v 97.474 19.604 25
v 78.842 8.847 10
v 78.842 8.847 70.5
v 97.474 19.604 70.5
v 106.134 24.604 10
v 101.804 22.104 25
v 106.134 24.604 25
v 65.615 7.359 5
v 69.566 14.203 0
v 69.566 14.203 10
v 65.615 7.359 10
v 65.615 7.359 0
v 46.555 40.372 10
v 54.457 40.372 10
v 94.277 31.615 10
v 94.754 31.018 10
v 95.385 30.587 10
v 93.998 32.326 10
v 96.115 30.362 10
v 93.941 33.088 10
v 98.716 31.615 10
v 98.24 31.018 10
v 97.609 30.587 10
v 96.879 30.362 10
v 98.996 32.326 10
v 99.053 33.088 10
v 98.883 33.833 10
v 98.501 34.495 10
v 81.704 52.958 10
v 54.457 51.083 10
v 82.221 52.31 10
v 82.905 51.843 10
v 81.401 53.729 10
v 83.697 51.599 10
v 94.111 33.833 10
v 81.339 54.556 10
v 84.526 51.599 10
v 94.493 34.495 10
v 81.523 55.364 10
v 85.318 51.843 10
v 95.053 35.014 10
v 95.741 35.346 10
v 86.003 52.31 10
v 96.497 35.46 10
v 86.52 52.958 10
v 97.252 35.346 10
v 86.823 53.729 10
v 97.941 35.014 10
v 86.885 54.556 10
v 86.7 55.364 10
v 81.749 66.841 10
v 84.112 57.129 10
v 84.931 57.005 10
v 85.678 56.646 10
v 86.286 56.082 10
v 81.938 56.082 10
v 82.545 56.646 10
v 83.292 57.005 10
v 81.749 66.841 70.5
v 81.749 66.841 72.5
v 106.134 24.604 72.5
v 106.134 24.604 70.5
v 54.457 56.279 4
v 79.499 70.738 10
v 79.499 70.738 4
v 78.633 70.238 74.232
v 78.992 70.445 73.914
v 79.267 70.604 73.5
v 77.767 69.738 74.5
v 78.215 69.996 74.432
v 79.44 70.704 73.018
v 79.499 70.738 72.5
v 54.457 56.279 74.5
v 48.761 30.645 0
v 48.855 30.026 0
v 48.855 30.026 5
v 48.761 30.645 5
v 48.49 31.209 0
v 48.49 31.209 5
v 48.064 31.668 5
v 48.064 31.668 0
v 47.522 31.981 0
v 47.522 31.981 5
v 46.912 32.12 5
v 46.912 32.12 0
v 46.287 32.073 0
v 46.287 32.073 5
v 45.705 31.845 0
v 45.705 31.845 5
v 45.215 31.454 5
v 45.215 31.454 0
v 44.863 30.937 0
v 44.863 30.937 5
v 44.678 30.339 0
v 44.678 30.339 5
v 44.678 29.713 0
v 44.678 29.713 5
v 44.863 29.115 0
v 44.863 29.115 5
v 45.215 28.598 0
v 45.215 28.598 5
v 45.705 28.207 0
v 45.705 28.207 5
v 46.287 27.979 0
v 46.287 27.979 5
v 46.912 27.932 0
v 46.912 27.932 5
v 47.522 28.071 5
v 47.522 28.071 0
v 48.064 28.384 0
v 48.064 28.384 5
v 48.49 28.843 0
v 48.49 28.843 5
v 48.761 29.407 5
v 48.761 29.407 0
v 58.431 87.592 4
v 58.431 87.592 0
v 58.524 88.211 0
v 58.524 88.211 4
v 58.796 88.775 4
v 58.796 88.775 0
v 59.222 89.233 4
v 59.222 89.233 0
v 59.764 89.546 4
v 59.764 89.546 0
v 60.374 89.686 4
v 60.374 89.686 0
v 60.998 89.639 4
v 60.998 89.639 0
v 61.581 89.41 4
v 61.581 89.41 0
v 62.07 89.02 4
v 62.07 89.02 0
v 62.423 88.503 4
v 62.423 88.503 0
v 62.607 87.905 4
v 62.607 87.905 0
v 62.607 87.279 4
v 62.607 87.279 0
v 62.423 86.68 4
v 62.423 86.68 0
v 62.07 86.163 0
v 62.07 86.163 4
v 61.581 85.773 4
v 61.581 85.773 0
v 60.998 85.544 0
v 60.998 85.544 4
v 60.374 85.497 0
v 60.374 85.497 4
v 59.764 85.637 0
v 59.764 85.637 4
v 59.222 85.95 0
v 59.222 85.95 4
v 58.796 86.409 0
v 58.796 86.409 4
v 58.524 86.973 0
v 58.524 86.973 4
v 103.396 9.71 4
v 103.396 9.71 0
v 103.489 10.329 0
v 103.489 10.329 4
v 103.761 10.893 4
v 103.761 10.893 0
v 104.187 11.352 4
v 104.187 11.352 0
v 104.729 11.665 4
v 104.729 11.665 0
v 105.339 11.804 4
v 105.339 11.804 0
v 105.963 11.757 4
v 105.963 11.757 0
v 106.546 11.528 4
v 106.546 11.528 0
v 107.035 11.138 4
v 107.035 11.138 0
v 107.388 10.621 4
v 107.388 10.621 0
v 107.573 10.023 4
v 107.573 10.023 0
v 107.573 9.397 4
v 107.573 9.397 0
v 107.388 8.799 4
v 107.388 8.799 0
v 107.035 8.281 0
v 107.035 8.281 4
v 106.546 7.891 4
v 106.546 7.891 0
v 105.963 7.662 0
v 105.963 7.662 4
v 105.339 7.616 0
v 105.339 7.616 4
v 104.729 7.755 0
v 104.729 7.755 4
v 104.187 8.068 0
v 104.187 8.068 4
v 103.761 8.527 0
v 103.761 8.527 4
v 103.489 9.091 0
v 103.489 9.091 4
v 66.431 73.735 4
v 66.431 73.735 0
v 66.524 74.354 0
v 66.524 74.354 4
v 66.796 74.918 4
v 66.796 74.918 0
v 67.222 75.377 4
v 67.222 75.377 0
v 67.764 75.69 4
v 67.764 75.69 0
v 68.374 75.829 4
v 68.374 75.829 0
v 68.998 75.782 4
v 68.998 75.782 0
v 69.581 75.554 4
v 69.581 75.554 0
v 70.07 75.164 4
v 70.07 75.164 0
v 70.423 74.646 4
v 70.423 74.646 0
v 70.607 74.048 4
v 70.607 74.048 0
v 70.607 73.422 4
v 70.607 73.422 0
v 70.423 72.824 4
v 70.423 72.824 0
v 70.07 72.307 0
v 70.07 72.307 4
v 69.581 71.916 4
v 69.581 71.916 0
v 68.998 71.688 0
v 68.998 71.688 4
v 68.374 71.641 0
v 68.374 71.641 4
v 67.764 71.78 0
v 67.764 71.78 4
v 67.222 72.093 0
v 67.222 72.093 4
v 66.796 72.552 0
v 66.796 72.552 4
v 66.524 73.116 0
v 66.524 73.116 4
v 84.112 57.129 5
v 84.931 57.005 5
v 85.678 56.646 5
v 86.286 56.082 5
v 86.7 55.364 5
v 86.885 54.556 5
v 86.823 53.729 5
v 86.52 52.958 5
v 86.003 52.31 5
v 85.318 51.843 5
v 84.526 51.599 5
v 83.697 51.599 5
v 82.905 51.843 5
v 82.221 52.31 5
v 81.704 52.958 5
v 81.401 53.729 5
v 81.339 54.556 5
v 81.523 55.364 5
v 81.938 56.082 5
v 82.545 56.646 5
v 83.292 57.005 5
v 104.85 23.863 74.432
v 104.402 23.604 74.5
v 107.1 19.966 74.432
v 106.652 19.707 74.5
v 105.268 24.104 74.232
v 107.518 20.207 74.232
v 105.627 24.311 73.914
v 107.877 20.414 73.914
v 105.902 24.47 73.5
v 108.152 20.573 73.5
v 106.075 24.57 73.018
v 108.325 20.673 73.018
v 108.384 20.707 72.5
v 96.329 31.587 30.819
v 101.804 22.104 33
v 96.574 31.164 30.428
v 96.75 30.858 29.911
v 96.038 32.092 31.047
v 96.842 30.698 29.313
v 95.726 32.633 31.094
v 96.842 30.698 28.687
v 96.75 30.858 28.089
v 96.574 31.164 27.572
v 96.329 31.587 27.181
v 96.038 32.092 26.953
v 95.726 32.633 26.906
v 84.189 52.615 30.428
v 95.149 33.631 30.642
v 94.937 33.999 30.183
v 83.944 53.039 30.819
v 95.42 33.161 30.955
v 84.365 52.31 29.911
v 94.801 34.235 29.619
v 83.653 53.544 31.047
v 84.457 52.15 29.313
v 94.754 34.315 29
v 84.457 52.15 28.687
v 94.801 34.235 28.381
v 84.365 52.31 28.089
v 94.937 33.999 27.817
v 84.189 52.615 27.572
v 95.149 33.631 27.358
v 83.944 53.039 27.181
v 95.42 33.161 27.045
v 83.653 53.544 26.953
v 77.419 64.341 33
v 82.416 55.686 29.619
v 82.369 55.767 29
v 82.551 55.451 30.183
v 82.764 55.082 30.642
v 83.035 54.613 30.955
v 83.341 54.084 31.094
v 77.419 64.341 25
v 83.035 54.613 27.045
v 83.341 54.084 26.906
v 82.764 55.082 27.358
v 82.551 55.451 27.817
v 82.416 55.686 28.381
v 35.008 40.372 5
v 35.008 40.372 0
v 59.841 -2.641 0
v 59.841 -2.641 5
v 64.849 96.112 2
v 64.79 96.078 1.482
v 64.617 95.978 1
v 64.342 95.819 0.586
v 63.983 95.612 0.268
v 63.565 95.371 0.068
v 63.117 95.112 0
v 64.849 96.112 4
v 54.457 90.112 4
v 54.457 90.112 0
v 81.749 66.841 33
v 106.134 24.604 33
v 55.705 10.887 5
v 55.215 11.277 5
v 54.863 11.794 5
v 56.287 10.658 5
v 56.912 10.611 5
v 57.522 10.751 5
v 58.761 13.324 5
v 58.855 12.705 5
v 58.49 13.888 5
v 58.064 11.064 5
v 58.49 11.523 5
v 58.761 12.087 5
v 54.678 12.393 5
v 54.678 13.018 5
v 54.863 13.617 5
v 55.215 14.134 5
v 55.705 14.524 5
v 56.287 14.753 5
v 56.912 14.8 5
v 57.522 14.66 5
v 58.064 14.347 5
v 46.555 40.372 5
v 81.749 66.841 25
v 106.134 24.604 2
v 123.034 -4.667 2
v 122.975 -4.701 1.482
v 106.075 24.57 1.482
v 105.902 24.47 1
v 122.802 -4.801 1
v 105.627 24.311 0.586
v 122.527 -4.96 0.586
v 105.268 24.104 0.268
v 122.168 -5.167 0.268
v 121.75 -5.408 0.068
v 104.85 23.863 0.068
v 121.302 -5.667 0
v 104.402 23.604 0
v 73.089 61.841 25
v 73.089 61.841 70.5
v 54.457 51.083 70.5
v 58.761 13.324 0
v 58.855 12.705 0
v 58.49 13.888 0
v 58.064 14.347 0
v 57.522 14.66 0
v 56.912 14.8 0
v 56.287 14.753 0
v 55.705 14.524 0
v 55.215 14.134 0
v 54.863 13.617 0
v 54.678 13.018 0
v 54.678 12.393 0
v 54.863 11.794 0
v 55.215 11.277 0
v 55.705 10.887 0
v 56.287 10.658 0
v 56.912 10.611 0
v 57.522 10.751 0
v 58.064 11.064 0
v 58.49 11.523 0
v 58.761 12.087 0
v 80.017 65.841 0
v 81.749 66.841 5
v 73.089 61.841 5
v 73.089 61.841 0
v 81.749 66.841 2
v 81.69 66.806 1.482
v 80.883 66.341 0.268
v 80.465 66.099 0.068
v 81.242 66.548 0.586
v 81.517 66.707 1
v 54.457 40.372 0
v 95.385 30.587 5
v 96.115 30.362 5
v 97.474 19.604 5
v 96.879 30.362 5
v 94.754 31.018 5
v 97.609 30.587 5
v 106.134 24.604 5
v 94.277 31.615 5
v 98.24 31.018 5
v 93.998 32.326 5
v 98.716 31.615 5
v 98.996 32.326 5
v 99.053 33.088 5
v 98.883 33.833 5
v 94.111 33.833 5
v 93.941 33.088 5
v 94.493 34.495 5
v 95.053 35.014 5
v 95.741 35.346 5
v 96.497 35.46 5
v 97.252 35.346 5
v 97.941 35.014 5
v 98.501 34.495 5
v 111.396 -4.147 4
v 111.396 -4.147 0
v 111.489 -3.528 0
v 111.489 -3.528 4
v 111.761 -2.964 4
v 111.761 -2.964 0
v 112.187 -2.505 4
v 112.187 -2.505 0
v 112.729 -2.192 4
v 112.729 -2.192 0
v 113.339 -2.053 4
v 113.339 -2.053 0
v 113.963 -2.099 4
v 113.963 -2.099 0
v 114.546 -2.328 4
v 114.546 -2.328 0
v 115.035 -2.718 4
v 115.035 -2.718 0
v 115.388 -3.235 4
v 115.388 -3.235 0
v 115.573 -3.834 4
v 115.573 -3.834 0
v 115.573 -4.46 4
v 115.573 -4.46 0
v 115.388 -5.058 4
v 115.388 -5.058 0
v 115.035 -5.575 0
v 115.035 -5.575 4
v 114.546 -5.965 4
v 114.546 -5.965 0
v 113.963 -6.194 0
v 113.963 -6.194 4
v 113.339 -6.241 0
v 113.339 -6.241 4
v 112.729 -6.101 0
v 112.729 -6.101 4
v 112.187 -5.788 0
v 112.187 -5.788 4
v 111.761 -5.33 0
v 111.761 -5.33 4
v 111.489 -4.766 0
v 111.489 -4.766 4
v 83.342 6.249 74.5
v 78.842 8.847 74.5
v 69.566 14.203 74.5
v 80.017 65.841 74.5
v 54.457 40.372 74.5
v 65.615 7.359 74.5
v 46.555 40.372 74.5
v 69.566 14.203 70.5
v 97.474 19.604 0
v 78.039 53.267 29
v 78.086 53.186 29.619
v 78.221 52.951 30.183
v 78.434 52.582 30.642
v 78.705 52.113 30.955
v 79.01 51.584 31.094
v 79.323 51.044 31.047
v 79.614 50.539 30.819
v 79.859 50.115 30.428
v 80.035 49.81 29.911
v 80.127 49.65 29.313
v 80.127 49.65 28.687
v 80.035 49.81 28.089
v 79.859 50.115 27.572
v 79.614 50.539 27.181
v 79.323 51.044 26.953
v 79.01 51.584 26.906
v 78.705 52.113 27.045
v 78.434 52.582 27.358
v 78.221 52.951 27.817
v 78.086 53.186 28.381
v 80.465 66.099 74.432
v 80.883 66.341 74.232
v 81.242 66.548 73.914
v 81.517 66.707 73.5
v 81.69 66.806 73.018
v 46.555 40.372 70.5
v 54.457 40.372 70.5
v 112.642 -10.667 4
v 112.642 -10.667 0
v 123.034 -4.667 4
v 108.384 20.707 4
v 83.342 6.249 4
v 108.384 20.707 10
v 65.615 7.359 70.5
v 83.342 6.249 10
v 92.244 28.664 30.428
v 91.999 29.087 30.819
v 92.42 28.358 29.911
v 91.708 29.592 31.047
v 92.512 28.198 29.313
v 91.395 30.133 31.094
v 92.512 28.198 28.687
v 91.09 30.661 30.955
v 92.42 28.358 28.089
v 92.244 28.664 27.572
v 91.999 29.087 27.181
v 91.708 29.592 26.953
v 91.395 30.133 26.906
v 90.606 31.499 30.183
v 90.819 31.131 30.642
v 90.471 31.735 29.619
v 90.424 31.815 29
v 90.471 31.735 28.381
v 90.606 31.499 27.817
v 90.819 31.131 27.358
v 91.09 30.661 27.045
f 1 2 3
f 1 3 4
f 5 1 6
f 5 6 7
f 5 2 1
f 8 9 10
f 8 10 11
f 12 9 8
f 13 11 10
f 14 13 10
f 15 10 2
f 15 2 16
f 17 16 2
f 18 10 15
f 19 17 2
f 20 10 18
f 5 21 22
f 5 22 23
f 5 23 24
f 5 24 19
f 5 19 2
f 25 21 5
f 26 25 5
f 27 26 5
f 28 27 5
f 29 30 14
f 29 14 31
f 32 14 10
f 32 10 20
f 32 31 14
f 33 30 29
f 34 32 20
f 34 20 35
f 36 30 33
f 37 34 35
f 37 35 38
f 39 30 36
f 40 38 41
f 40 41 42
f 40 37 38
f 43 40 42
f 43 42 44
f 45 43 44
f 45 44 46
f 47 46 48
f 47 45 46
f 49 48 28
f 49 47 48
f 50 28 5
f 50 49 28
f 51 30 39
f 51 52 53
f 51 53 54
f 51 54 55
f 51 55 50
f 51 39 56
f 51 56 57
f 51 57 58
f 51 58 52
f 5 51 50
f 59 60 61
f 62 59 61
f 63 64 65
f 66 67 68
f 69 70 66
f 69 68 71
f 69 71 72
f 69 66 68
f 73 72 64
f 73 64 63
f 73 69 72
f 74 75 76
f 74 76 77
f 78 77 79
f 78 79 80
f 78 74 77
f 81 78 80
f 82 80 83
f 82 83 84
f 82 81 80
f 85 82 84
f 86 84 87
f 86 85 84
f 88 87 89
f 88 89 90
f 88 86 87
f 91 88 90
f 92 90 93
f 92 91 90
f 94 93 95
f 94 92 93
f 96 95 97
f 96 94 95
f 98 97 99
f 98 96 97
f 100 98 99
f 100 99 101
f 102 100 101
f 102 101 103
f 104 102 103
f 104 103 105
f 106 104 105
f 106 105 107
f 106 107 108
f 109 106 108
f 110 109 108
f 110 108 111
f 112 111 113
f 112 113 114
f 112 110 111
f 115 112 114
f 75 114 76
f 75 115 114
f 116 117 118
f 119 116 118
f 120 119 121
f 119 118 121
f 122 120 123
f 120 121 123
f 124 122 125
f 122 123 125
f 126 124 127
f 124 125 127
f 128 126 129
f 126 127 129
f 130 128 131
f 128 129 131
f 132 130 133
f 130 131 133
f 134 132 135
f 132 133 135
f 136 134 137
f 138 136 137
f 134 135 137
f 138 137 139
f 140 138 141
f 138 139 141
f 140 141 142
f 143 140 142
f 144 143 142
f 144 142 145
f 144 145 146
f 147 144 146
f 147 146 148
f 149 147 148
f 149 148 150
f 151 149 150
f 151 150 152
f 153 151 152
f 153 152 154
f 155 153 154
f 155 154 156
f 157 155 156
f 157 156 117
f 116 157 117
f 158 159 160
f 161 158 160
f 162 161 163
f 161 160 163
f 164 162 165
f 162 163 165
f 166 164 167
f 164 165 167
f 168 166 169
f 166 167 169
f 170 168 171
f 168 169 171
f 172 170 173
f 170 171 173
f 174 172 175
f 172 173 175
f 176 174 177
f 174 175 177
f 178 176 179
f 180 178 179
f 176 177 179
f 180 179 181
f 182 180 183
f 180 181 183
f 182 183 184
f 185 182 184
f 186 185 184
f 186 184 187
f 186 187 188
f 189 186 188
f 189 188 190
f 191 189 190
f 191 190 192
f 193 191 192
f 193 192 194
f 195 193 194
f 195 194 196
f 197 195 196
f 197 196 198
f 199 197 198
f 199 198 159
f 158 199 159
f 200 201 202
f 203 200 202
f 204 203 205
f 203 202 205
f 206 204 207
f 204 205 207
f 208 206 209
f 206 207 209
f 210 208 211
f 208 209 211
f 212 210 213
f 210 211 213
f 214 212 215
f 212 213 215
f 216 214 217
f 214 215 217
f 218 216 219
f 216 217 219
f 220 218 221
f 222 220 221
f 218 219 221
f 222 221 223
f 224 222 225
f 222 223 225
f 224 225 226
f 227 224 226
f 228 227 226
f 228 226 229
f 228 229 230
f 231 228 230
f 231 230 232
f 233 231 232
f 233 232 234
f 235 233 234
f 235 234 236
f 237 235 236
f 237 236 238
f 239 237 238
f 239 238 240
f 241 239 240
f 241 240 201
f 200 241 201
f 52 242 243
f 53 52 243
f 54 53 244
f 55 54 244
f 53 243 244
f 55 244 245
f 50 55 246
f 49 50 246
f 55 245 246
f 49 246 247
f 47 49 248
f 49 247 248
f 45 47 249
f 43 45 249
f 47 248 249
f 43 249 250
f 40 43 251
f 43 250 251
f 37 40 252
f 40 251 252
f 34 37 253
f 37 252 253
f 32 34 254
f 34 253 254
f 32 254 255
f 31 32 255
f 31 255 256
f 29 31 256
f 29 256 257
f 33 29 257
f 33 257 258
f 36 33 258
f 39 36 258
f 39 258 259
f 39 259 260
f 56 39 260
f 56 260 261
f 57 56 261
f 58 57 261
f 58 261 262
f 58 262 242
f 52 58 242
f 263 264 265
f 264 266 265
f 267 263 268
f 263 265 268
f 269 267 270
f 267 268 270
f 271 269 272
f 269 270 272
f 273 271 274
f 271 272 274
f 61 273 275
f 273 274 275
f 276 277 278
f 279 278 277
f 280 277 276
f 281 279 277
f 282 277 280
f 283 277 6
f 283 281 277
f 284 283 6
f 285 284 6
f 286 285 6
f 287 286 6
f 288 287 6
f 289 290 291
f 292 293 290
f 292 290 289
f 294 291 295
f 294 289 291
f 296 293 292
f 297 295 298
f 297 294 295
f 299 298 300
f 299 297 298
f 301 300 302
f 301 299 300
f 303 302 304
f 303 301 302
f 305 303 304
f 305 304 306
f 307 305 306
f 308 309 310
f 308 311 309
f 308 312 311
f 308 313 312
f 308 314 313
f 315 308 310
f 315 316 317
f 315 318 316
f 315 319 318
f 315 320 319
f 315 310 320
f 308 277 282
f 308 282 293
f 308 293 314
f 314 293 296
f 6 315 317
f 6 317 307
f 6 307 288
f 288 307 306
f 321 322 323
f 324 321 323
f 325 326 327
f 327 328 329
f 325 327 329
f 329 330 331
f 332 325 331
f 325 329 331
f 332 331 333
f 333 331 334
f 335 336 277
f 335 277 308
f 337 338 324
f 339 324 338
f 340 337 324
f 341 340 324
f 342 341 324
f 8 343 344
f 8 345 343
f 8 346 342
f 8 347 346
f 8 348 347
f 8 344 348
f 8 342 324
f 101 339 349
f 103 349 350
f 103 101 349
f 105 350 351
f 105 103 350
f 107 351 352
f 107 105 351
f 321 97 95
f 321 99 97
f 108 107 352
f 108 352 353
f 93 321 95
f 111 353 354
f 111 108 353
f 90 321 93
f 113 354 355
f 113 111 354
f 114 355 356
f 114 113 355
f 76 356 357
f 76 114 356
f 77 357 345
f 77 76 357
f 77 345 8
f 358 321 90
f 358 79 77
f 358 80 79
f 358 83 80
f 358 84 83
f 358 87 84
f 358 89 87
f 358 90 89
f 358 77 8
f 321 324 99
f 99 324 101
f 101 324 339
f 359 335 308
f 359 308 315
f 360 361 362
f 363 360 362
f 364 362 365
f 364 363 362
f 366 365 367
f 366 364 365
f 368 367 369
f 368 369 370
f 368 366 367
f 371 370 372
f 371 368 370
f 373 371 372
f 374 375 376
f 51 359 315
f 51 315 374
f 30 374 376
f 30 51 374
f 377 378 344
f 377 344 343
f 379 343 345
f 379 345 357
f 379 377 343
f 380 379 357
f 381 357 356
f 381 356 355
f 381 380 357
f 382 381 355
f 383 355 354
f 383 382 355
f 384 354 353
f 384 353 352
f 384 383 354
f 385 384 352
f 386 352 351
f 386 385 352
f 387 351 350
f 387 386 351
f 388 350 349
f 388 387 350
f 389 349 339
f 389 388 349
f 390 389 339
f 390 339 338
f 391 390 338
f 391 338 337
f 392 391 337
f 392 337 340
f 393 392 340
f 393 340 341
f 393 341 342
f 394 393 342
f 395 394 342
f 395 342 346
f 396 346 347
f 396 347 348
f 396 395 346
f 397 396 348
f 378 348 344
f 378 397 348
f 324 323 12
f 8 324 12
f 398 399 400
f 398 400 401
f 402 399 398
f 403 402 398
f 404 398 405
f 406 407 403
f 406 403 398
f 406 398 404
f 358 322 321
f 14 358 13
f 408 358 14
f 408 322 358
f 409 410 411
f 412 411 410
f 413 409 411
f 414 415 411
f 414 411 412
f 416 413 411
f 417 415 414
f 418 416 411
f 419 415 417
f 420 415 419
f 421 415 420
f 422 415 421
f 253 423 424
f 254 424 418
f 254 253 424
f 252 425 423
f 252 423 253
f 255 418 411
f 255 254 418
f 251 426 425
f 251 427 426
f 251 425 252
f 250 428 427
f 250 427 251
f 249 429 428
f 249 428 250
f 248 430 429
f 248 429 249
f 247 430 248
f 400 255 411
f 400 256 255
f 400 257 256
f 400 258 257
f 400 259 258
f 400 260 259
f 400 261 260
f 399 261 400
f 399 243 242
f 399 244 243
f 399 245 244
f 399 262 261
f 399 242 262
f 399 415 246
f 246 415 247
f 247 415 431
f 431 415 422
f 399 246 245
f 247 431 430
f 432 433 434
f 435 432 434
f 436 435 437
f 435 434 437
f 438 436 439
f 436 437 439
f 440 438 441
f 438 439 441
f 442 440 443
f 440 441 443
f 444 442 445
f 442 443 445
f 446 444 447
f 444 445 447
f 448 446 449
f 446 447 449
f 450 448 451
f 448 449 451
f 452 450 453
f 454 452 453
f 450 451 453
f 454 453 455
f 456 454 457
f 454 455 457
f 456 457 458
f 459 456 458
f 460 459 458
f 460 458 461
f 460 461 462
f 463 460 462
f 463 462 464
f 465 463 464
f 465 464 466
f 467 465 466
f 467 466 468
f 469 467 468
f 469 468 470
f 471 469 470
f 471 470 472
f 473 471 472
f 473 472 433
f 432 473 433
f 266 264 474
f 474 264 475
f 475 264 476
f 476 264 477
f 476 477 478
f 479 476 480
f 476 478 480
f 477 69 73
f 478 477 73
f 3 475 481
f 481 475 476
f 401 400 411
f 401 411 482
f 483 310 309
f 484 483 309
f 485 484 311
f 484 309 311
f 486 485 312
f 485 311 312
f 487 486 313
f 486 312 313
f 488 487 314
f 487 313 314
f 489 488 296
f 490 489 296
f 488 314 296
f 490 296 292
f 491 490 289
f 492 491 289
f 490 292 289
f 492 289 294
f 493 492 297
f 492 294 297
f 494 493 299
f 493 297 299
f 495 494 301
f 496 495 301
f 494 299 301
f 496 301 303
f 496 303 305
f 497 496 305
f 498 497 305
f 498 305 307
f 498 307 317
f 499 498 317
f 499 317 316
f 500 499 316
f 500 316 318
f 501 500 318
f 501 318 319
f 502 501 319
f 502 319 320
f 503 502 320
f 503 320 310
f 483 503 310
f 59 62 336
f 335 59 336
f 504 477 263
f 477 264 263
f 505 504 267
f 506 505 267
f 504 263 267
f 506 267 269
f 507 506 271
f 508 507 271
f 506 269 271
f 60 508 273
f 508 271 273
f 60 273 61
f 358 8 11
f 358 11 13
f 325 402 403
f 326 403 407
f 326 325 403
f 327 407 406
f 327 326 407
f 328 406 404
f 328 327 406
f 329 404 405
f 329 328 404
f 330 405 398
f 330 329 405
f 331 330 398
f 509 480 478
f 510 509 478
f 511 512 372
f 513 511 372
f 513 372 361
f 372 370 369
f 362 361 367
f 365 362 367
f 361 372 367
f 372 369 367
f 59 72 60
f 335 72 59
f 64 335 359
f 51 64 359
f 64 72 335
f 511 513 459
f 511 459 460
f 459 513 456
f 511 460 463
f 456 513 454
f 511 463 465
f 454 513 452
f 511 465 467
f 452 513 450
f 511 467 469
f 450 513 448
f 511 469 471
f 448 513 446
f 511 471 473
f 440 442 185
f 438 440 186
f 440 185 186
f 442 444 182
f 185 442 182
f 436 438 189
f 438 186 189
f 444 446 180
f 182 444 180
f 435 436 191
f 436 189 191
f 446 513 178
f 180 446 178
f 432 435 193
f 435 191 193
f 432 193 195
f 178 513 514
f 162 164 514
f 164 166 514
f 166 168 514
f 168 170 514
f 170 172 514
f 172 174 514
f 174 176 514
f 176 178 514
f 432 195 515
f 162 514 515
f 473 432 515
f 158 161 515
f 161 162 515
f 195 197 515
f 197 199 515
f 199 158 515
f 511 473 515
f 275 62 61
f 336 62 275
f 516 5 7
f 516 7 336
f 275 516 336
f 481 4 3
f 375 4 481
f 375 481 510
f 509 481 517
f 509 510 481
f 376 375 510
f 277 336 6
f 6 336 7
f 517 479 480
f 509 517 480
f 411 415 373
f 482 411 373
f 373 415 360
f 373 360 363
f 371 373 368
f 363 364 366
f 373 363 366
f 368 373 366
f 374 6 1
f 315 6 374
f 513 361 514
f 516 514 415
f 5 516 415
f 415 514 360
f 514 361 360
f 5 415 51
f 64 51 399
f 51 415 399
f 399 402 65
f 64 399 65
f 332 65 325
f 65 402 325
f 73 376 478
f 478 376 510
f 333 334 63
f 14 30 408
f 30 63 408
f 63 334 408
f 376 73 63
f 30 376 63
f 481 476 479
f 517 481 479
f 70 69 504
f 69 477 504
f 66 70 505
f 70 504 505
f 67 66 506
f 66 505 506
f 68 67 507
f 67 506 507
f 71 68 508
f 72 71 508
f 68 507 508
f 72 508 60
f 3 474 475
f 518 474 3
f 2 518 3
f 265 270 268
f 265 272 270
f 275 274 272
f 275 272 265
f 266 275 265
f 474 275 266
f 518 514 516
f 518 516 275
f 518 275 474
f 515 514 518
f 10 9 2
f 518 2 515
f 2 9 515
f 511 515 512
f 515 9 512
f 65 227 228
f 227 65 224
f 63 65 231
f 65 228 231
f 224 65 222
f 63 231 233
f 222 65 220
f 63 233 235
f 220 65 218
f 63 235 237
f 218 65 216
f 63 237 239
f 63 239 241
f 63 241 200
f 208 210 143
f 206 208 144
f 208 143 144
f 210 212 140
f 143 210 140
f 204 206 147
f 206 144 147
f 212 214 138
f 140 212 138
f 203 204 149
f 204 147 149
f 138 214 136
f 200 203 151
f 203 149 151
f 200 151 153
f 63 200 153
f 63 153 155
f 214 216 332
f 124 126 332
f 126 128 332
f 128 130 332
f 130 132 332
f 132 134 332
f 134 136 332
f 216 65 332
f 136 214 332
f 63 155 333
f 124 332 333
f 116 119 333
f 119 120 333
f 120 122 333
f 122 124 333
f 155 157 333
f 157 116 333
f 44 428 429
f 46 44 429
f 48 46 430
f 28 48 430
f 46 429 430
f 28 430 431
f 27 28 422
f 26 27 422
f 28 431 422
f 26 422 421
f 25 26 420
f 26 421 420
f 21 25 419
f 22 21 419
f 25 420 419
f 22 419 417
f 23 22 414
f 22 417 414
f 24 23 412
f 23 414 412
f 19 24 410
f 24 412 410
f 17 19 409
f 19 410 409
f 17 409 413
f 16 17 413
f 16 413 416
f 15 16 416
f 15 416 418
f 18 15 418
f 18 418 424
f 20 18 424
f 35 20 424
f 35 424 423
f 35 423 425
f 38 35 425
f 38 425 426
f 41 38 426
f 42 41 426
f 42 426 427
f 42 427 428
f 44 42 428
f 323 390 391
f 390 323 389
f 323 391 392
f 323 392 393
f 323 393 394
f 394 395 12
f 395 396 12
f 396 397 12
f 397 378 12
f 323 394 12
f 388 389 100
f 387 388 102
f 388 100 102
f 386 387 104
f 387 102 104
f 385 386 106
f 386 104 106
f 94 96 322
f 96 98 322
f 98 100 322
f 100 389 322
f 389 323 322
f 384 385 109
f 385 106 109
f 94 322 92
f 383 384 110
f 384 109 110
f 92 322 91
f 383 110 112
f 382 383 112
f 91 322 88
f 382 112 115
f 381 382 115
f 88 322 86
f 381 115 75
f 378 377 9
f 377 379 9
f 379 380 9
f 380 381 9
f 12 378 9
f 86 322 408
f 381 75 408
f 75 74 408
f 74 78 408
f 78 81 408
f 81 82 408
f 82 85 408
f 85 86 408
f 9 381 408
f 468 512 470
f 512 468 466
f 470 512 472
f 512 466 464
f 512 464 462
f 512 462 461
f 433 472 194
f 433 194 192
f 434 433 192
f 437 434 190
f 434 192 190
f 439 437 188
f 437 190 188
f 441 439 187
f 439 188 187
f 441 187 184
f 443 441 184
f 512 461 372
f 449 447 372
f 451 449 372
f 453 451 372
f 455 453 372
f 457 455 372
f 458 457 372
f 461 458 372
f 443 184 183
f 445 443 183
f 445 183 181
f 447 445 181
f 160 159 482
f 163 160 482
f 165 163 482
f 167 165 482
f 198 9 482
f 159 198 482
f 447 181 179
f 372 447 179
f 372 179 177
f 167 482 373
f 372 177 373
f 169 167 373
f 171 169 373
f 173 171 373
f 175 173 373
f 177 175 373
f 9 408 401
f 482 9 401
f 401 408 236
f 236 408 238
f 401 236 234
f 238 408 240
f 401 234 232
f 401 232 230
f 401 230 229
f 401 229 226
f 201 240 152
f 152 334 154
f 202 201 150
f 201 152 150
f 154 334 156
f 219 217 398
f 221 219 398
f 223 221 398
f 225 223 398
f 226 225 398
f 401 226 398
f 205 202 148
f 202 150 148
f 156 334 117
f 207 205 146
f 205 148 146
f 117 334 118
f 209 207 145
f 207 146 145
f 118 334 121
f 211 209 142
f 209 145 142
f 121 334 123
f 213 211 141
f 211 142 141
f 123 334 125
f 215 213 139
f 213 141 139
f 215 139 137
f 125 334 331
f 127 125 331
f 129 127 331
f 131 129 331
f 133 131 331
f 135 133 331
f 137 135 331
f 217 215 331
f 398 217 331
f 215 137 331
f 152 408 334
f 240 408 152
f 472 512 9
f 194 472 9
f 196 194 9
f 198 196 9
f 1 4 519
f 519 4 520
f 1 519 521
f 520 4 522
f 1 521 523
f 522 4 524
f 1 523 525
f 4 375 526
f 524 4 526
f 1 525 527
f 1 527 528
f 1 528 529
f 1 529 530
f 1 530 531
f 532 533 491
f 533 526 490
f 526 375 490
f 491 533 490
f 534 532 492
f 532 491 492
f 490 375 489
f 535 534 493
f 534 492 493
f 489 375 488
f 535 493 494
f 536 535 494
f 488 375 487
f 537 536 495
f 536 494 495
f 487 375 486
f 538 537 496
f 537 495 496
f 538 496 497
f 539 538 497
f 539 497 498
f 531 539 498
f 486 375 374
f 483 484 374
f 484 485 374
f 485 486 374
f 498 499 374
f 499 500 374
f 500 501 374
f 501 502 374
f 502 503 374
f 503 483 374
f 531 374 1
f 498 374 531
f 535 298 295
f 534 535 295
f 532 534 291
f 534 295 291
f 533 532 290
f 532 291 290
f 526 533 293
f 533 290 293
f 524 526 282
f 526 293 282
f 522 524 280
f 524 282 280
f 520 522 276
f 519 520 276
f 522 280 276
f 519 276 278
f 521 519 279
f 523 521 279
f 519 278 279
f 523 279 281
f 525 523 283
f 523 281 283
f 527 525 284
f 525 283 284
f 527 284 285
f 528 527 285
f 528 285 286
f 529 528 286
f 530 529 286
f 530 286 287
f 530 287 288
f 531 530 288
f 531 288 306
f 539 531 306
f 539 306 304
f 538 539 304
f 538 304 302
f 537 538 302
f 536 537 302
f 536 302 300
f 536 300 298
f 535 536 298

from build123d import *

# Parameters (mm, degrees)
SKETCH_1_R          = 2.1
EXTRUDE_1_DEPTH     = 5
EXTRUDE_2_DEPTH     = 5
EXTRUDE_3_DEPTH     = 10
SKETCH_4_R          = 2.1
CUT_EXTRUDE_1_DEPTH = 10
SKETCH_5_R          = 2.1
CUT_EXTRUDE_2_DEPTH = 157.444761979
CUT_EXTRUDE_3_DEPTH = 6
EXTRUDE_4_DEPTH     = 64.5
EXTRUDE_5_DEPTH     = 4
SKETCH_9_W          = 49.5
SKETCH_9_H          = 57.77011897
EXTRUDE_6_DEPTH     = 10
SKETCH_10_W         = 5
SKETCH_10_H         = 48.77011897
CUT_EXTRUDE_4_DEPTH = 10
CUT_EXTRUDE_5_REACH = 172.895
SKETCH_11_R         = 2.5629981
SKETCH_11_R_2       = 2.780591795
FILLET_1_R          = 2
SKETCH_12_R         = 2.1
CUT_EXTRUDE_6_DEPTH = 10
SKETCH_13_W         = 8
SKETCH_13_H         = 48.77011897
CUT_EXTRUDE_7_DEPTH = 5


with BuildPart() as part:
    # 草圖1 → 填料-伸長1 (new body)
    # profile 1 of 2: a face of its own
    with BuildSketch(Plane.XY):
        Polygon((46.554726499, 40.372196633), (35.007721115, 40.372196633), (59.841223807, -2.64069176), (65.614726499, 7.35930824), align=None)
        with Locations((56.75459948, 12.705498399)):
            Circle(SKETCH_1_R, mode=Mode.SUBTRACT)
        with Locations((46.75459948, 30.026006474)):
            Circle(SKETCH_1_R, mode=Mode.SUBTRACT)
    # profile 2 of 2: a face of its own
    with BuildSketch(Plane.XY):
        Polygon((54.456814697, 40.372196633), (46.554726499, 40.372196633), (65.614726499, 7.35930824), (69.565770598, 14.202717363), align=None)
    extrude(amount=EXTRUDE_1_DEPTH)

    # 草圖2 → 填料-伸長2 (add)
    with BuildSketch(Plane.XY.offset(5)):
        Polygon((54.456814697, 40.372196633), (69.565770598, 14.202717363), (65.614726499, 7.35930824), (46.554726499, 40.372196633), align=None)
    extrude(amount=EXTRUDE_2_DEPTH)

    # 草圖3 → 填料-伸長3 (add)
    with BuildSketch(Plane(origin=(0, 0, 0), x_dir=(-1, 0, 0), z_dir=(0, 0, -1))):
        Polygon((-69.565770598, 14.202717363), (-112.641874182, -10.667282637), (-123.034179028, -4.667282637), (-64.849119543, 96.112196633), (-54.456814697, 90.112196633), (-54.456814697, 40.372196633), align=None)
    extrude(amount=-EXTRUDE_3_DEPTH)

    # 草圖4 → 除料-伸長1 (cut)
    with BuildSketch(Plane(origin=(0, 0, 0), x_dir=(-1, 0, 0), z_dir=(0, 0, -1))):
        with Locations((-113.495975798, -4.146630029)):
            Circle(SKETCH_4_R)
        with Locations((-105.495975798, 9.709776431)):
            Circle(SKETCH_4_R)
    extrude(amount=-CUT_EXTRUDE_1_DEPTH, mode=Mode.SUBTRACT)

    # 草圖5 → 除料-伸長2 (cut, through all)
    with BuildSketch(Plane(origin=(0, 0, 0), x_dir=(-1, 0, 0), z_dir=(0, 0, -1))):
        with Locations((-60.530916312, 87.591544025)):
            Circle(SKETCH_5_R)
        with Locations((-68.530916312, 73.735137564)):
            Circle(SKETCH_5_R)
    extrude(amount=-CUT_EXTRUDE_2_DEPTH, mode=Mode.SUBTRACT)

    # 草圖6 → 除料-伸長3 (cut)
    with BuildSketch(Plane.XY.offset(10)):
        Polygon((79.499119543, 70.737652302), (54.456814697, 56.279470858), (54.456814697, 90.112196633), (64.849119543, 96.112196633), align=None)
        Polygon((83.341874182, 6.24908025), (108.384179028, 20.707261694), (123.034179028, -4.667282637), (112.641874182, -10.667282637), align=None)
    extrude(amount=-CUT_EXTRUDE_3_DEPTH, mode=Mode.SUBTRACT)

    # 草圖7 → 填料-伸長4 (add)
    with BuildSketch(Plane.XY.offset(10)):
        Polygon((78.841874182, 8.847156461), (106.134179028, 24.604376011), (108.384179028, 20.707261694), (83.341874182, 6.24908025), align=None)
        Polygon((54.456814697, 56.279470858), (79.499119543, 70.737652302), (81.749119543, 66.840537985), (54.456814697, 51.083318435), align=None)
    extrude(amount=EXTRUDE_4_DEPTH)

    # 草圖8 → 填料-伸長5 (add)
    with BuildSketch(Plane.XY.offset(74.5)):
        Polygon((79.499119543, 70.737652302), (108.384179028, 20.707261694), (83.341874182, 6.24908025), (69.565770598, 14.202717363), (65.614726499, 7.35930824), (46.554726499, 40.372196633), (54.456814697, 40.372196633), (54.456814697, 56.279470858), align=None)
    extrude(amount=-EXTRUDE_5_DEPTH)

    # 草圖9 → 填料-伸長6 (add)
    with BuildSketch(Plane(origin=(90.254641606, 52.108541627, 0), x_dir=(0, 0, -1), z_dir=(0.8660254037844403, 0.4999999999999973, 0))):
        with Locations((-49.75, -7.374015359)):
            Rectangle(SKETCH_9_W, SKETCH_9_H)
    extrude(amount=-EXTRUDE_6_DEPTH)

    # 草圖10 → 除料-伸長4 (cut)
    with BuildSketch(Plane(origin=(90.254641606, 52.108541627, 0), x_dir=(0, 0, -1), z_dir=(0.8660254037844403, 0.4999999999999973, 0))):
        with Locations((-2.5, -7.374015359)):
            Rectangle(SKETCH_10_W, SKETCH_10_H)
    extrude(amount=-CUT_EXTRUDE_4_DEPTH, mode=Mode.SUBTRACT)

    # 草圖11 → 除料-伸長5 (cut, up to next)
    with BuildSketch(Plane(origin=(0, 0, 5), x_dir=(-1, 0, 0), z_dir=(0, 0, -1)), mode=Mode.PRIVATE) as cut_extrude_5_sk1:
        with Locations(Location((-96.496872332, 32.896680856, 0), (0, 0, 90))):
            Circle(SKETCH_11_R)
    cut_extrude_5_tool1 = extrude(cut_extrude_5_sk1.sketch, amount=-CUT_EXTRUDE_5_REACH, mode=Mode.PRIVATE) & part.part
    # 草圖11 → 除料-伸長5 (cut, up to next)
    with BuildSketch(Plane(origin=(0, 0, 5), x_dir=(-1, 0, 0), z_dir=(0, 0, -1)), mode=Mode.PRIVATE) as cut_extrude_5_sk2:
        with Locations(Location((-84.111812847, 54.348233139, 0), (0, 0, 90))):
            Circle(SKETCH_11_R_2)
    cut_extrude_5_tool2 = extrude(cut_extrude_5_sk2.sketch, amount=-CUT_EXTRUDE_5_REACH, mode=Mode.PRIVATE) & part.part
    add(cut_extrude_5_tool1.solids().sort_by_distance((96.496872, 32.896681, 5))[0], mode=Mode.SUBTRACT)
    add(cut_extrude_5_tool2.solids().sort_by_distance((84.111813, 54.348233, 5))[0], mode=Mode.SUBTRACT)

    # 圓角1
    fillet_1_edges = [part.edges().sort_by_distance(p)[0] for p in [
        (93.941649285, 45.722456998, 74.5),
        (114.584179028, 9.968546687, 0),
        (73.299119543, 81.476367309, 0),
    ]]
    fillet(fillet_1_edges, radius=FILLET_1_R)

    # 草圖12 → 除料-伸長6 (cut)
    with BuildSketch(Plane(origin=(90.254641606, 52.108541627, 0), x_dir=(0, 0, -1), z_dir=(0.8660254037844403, 0.4999999999999973, 0))):
        with Locations(Location((-29, -19.759074844, 0), (0, 0, 90))):
            Circle(SKETCH_12_R)
        with Locations(Location((-29, 5.011044126, 0), (0, 0, 90))):
            Circle(SKETCH_12_R)
    extrude(amount=-CUT_EXTRUDE_6_DEPTH, mode=Mode.SUBTRACT)

    # 草圖13 → 除料-伸長7 (cut)
    with BuildSketch(Plane(origin=(90.254641606, 52.108541627, 0), x_dir=(0, 0, -1), z_dir=(0.8660254037844403, 0.4999999999999973, 0))):
        with Locations((-29, -7.374015359)):
            Rectangle(SKETCH_13_W, SKETCH_13_H)
    extrude(amount=-CUT_EXTRUDE_7_DEPTH, mode=Mode.SUBTRACT)


solid = part.part
